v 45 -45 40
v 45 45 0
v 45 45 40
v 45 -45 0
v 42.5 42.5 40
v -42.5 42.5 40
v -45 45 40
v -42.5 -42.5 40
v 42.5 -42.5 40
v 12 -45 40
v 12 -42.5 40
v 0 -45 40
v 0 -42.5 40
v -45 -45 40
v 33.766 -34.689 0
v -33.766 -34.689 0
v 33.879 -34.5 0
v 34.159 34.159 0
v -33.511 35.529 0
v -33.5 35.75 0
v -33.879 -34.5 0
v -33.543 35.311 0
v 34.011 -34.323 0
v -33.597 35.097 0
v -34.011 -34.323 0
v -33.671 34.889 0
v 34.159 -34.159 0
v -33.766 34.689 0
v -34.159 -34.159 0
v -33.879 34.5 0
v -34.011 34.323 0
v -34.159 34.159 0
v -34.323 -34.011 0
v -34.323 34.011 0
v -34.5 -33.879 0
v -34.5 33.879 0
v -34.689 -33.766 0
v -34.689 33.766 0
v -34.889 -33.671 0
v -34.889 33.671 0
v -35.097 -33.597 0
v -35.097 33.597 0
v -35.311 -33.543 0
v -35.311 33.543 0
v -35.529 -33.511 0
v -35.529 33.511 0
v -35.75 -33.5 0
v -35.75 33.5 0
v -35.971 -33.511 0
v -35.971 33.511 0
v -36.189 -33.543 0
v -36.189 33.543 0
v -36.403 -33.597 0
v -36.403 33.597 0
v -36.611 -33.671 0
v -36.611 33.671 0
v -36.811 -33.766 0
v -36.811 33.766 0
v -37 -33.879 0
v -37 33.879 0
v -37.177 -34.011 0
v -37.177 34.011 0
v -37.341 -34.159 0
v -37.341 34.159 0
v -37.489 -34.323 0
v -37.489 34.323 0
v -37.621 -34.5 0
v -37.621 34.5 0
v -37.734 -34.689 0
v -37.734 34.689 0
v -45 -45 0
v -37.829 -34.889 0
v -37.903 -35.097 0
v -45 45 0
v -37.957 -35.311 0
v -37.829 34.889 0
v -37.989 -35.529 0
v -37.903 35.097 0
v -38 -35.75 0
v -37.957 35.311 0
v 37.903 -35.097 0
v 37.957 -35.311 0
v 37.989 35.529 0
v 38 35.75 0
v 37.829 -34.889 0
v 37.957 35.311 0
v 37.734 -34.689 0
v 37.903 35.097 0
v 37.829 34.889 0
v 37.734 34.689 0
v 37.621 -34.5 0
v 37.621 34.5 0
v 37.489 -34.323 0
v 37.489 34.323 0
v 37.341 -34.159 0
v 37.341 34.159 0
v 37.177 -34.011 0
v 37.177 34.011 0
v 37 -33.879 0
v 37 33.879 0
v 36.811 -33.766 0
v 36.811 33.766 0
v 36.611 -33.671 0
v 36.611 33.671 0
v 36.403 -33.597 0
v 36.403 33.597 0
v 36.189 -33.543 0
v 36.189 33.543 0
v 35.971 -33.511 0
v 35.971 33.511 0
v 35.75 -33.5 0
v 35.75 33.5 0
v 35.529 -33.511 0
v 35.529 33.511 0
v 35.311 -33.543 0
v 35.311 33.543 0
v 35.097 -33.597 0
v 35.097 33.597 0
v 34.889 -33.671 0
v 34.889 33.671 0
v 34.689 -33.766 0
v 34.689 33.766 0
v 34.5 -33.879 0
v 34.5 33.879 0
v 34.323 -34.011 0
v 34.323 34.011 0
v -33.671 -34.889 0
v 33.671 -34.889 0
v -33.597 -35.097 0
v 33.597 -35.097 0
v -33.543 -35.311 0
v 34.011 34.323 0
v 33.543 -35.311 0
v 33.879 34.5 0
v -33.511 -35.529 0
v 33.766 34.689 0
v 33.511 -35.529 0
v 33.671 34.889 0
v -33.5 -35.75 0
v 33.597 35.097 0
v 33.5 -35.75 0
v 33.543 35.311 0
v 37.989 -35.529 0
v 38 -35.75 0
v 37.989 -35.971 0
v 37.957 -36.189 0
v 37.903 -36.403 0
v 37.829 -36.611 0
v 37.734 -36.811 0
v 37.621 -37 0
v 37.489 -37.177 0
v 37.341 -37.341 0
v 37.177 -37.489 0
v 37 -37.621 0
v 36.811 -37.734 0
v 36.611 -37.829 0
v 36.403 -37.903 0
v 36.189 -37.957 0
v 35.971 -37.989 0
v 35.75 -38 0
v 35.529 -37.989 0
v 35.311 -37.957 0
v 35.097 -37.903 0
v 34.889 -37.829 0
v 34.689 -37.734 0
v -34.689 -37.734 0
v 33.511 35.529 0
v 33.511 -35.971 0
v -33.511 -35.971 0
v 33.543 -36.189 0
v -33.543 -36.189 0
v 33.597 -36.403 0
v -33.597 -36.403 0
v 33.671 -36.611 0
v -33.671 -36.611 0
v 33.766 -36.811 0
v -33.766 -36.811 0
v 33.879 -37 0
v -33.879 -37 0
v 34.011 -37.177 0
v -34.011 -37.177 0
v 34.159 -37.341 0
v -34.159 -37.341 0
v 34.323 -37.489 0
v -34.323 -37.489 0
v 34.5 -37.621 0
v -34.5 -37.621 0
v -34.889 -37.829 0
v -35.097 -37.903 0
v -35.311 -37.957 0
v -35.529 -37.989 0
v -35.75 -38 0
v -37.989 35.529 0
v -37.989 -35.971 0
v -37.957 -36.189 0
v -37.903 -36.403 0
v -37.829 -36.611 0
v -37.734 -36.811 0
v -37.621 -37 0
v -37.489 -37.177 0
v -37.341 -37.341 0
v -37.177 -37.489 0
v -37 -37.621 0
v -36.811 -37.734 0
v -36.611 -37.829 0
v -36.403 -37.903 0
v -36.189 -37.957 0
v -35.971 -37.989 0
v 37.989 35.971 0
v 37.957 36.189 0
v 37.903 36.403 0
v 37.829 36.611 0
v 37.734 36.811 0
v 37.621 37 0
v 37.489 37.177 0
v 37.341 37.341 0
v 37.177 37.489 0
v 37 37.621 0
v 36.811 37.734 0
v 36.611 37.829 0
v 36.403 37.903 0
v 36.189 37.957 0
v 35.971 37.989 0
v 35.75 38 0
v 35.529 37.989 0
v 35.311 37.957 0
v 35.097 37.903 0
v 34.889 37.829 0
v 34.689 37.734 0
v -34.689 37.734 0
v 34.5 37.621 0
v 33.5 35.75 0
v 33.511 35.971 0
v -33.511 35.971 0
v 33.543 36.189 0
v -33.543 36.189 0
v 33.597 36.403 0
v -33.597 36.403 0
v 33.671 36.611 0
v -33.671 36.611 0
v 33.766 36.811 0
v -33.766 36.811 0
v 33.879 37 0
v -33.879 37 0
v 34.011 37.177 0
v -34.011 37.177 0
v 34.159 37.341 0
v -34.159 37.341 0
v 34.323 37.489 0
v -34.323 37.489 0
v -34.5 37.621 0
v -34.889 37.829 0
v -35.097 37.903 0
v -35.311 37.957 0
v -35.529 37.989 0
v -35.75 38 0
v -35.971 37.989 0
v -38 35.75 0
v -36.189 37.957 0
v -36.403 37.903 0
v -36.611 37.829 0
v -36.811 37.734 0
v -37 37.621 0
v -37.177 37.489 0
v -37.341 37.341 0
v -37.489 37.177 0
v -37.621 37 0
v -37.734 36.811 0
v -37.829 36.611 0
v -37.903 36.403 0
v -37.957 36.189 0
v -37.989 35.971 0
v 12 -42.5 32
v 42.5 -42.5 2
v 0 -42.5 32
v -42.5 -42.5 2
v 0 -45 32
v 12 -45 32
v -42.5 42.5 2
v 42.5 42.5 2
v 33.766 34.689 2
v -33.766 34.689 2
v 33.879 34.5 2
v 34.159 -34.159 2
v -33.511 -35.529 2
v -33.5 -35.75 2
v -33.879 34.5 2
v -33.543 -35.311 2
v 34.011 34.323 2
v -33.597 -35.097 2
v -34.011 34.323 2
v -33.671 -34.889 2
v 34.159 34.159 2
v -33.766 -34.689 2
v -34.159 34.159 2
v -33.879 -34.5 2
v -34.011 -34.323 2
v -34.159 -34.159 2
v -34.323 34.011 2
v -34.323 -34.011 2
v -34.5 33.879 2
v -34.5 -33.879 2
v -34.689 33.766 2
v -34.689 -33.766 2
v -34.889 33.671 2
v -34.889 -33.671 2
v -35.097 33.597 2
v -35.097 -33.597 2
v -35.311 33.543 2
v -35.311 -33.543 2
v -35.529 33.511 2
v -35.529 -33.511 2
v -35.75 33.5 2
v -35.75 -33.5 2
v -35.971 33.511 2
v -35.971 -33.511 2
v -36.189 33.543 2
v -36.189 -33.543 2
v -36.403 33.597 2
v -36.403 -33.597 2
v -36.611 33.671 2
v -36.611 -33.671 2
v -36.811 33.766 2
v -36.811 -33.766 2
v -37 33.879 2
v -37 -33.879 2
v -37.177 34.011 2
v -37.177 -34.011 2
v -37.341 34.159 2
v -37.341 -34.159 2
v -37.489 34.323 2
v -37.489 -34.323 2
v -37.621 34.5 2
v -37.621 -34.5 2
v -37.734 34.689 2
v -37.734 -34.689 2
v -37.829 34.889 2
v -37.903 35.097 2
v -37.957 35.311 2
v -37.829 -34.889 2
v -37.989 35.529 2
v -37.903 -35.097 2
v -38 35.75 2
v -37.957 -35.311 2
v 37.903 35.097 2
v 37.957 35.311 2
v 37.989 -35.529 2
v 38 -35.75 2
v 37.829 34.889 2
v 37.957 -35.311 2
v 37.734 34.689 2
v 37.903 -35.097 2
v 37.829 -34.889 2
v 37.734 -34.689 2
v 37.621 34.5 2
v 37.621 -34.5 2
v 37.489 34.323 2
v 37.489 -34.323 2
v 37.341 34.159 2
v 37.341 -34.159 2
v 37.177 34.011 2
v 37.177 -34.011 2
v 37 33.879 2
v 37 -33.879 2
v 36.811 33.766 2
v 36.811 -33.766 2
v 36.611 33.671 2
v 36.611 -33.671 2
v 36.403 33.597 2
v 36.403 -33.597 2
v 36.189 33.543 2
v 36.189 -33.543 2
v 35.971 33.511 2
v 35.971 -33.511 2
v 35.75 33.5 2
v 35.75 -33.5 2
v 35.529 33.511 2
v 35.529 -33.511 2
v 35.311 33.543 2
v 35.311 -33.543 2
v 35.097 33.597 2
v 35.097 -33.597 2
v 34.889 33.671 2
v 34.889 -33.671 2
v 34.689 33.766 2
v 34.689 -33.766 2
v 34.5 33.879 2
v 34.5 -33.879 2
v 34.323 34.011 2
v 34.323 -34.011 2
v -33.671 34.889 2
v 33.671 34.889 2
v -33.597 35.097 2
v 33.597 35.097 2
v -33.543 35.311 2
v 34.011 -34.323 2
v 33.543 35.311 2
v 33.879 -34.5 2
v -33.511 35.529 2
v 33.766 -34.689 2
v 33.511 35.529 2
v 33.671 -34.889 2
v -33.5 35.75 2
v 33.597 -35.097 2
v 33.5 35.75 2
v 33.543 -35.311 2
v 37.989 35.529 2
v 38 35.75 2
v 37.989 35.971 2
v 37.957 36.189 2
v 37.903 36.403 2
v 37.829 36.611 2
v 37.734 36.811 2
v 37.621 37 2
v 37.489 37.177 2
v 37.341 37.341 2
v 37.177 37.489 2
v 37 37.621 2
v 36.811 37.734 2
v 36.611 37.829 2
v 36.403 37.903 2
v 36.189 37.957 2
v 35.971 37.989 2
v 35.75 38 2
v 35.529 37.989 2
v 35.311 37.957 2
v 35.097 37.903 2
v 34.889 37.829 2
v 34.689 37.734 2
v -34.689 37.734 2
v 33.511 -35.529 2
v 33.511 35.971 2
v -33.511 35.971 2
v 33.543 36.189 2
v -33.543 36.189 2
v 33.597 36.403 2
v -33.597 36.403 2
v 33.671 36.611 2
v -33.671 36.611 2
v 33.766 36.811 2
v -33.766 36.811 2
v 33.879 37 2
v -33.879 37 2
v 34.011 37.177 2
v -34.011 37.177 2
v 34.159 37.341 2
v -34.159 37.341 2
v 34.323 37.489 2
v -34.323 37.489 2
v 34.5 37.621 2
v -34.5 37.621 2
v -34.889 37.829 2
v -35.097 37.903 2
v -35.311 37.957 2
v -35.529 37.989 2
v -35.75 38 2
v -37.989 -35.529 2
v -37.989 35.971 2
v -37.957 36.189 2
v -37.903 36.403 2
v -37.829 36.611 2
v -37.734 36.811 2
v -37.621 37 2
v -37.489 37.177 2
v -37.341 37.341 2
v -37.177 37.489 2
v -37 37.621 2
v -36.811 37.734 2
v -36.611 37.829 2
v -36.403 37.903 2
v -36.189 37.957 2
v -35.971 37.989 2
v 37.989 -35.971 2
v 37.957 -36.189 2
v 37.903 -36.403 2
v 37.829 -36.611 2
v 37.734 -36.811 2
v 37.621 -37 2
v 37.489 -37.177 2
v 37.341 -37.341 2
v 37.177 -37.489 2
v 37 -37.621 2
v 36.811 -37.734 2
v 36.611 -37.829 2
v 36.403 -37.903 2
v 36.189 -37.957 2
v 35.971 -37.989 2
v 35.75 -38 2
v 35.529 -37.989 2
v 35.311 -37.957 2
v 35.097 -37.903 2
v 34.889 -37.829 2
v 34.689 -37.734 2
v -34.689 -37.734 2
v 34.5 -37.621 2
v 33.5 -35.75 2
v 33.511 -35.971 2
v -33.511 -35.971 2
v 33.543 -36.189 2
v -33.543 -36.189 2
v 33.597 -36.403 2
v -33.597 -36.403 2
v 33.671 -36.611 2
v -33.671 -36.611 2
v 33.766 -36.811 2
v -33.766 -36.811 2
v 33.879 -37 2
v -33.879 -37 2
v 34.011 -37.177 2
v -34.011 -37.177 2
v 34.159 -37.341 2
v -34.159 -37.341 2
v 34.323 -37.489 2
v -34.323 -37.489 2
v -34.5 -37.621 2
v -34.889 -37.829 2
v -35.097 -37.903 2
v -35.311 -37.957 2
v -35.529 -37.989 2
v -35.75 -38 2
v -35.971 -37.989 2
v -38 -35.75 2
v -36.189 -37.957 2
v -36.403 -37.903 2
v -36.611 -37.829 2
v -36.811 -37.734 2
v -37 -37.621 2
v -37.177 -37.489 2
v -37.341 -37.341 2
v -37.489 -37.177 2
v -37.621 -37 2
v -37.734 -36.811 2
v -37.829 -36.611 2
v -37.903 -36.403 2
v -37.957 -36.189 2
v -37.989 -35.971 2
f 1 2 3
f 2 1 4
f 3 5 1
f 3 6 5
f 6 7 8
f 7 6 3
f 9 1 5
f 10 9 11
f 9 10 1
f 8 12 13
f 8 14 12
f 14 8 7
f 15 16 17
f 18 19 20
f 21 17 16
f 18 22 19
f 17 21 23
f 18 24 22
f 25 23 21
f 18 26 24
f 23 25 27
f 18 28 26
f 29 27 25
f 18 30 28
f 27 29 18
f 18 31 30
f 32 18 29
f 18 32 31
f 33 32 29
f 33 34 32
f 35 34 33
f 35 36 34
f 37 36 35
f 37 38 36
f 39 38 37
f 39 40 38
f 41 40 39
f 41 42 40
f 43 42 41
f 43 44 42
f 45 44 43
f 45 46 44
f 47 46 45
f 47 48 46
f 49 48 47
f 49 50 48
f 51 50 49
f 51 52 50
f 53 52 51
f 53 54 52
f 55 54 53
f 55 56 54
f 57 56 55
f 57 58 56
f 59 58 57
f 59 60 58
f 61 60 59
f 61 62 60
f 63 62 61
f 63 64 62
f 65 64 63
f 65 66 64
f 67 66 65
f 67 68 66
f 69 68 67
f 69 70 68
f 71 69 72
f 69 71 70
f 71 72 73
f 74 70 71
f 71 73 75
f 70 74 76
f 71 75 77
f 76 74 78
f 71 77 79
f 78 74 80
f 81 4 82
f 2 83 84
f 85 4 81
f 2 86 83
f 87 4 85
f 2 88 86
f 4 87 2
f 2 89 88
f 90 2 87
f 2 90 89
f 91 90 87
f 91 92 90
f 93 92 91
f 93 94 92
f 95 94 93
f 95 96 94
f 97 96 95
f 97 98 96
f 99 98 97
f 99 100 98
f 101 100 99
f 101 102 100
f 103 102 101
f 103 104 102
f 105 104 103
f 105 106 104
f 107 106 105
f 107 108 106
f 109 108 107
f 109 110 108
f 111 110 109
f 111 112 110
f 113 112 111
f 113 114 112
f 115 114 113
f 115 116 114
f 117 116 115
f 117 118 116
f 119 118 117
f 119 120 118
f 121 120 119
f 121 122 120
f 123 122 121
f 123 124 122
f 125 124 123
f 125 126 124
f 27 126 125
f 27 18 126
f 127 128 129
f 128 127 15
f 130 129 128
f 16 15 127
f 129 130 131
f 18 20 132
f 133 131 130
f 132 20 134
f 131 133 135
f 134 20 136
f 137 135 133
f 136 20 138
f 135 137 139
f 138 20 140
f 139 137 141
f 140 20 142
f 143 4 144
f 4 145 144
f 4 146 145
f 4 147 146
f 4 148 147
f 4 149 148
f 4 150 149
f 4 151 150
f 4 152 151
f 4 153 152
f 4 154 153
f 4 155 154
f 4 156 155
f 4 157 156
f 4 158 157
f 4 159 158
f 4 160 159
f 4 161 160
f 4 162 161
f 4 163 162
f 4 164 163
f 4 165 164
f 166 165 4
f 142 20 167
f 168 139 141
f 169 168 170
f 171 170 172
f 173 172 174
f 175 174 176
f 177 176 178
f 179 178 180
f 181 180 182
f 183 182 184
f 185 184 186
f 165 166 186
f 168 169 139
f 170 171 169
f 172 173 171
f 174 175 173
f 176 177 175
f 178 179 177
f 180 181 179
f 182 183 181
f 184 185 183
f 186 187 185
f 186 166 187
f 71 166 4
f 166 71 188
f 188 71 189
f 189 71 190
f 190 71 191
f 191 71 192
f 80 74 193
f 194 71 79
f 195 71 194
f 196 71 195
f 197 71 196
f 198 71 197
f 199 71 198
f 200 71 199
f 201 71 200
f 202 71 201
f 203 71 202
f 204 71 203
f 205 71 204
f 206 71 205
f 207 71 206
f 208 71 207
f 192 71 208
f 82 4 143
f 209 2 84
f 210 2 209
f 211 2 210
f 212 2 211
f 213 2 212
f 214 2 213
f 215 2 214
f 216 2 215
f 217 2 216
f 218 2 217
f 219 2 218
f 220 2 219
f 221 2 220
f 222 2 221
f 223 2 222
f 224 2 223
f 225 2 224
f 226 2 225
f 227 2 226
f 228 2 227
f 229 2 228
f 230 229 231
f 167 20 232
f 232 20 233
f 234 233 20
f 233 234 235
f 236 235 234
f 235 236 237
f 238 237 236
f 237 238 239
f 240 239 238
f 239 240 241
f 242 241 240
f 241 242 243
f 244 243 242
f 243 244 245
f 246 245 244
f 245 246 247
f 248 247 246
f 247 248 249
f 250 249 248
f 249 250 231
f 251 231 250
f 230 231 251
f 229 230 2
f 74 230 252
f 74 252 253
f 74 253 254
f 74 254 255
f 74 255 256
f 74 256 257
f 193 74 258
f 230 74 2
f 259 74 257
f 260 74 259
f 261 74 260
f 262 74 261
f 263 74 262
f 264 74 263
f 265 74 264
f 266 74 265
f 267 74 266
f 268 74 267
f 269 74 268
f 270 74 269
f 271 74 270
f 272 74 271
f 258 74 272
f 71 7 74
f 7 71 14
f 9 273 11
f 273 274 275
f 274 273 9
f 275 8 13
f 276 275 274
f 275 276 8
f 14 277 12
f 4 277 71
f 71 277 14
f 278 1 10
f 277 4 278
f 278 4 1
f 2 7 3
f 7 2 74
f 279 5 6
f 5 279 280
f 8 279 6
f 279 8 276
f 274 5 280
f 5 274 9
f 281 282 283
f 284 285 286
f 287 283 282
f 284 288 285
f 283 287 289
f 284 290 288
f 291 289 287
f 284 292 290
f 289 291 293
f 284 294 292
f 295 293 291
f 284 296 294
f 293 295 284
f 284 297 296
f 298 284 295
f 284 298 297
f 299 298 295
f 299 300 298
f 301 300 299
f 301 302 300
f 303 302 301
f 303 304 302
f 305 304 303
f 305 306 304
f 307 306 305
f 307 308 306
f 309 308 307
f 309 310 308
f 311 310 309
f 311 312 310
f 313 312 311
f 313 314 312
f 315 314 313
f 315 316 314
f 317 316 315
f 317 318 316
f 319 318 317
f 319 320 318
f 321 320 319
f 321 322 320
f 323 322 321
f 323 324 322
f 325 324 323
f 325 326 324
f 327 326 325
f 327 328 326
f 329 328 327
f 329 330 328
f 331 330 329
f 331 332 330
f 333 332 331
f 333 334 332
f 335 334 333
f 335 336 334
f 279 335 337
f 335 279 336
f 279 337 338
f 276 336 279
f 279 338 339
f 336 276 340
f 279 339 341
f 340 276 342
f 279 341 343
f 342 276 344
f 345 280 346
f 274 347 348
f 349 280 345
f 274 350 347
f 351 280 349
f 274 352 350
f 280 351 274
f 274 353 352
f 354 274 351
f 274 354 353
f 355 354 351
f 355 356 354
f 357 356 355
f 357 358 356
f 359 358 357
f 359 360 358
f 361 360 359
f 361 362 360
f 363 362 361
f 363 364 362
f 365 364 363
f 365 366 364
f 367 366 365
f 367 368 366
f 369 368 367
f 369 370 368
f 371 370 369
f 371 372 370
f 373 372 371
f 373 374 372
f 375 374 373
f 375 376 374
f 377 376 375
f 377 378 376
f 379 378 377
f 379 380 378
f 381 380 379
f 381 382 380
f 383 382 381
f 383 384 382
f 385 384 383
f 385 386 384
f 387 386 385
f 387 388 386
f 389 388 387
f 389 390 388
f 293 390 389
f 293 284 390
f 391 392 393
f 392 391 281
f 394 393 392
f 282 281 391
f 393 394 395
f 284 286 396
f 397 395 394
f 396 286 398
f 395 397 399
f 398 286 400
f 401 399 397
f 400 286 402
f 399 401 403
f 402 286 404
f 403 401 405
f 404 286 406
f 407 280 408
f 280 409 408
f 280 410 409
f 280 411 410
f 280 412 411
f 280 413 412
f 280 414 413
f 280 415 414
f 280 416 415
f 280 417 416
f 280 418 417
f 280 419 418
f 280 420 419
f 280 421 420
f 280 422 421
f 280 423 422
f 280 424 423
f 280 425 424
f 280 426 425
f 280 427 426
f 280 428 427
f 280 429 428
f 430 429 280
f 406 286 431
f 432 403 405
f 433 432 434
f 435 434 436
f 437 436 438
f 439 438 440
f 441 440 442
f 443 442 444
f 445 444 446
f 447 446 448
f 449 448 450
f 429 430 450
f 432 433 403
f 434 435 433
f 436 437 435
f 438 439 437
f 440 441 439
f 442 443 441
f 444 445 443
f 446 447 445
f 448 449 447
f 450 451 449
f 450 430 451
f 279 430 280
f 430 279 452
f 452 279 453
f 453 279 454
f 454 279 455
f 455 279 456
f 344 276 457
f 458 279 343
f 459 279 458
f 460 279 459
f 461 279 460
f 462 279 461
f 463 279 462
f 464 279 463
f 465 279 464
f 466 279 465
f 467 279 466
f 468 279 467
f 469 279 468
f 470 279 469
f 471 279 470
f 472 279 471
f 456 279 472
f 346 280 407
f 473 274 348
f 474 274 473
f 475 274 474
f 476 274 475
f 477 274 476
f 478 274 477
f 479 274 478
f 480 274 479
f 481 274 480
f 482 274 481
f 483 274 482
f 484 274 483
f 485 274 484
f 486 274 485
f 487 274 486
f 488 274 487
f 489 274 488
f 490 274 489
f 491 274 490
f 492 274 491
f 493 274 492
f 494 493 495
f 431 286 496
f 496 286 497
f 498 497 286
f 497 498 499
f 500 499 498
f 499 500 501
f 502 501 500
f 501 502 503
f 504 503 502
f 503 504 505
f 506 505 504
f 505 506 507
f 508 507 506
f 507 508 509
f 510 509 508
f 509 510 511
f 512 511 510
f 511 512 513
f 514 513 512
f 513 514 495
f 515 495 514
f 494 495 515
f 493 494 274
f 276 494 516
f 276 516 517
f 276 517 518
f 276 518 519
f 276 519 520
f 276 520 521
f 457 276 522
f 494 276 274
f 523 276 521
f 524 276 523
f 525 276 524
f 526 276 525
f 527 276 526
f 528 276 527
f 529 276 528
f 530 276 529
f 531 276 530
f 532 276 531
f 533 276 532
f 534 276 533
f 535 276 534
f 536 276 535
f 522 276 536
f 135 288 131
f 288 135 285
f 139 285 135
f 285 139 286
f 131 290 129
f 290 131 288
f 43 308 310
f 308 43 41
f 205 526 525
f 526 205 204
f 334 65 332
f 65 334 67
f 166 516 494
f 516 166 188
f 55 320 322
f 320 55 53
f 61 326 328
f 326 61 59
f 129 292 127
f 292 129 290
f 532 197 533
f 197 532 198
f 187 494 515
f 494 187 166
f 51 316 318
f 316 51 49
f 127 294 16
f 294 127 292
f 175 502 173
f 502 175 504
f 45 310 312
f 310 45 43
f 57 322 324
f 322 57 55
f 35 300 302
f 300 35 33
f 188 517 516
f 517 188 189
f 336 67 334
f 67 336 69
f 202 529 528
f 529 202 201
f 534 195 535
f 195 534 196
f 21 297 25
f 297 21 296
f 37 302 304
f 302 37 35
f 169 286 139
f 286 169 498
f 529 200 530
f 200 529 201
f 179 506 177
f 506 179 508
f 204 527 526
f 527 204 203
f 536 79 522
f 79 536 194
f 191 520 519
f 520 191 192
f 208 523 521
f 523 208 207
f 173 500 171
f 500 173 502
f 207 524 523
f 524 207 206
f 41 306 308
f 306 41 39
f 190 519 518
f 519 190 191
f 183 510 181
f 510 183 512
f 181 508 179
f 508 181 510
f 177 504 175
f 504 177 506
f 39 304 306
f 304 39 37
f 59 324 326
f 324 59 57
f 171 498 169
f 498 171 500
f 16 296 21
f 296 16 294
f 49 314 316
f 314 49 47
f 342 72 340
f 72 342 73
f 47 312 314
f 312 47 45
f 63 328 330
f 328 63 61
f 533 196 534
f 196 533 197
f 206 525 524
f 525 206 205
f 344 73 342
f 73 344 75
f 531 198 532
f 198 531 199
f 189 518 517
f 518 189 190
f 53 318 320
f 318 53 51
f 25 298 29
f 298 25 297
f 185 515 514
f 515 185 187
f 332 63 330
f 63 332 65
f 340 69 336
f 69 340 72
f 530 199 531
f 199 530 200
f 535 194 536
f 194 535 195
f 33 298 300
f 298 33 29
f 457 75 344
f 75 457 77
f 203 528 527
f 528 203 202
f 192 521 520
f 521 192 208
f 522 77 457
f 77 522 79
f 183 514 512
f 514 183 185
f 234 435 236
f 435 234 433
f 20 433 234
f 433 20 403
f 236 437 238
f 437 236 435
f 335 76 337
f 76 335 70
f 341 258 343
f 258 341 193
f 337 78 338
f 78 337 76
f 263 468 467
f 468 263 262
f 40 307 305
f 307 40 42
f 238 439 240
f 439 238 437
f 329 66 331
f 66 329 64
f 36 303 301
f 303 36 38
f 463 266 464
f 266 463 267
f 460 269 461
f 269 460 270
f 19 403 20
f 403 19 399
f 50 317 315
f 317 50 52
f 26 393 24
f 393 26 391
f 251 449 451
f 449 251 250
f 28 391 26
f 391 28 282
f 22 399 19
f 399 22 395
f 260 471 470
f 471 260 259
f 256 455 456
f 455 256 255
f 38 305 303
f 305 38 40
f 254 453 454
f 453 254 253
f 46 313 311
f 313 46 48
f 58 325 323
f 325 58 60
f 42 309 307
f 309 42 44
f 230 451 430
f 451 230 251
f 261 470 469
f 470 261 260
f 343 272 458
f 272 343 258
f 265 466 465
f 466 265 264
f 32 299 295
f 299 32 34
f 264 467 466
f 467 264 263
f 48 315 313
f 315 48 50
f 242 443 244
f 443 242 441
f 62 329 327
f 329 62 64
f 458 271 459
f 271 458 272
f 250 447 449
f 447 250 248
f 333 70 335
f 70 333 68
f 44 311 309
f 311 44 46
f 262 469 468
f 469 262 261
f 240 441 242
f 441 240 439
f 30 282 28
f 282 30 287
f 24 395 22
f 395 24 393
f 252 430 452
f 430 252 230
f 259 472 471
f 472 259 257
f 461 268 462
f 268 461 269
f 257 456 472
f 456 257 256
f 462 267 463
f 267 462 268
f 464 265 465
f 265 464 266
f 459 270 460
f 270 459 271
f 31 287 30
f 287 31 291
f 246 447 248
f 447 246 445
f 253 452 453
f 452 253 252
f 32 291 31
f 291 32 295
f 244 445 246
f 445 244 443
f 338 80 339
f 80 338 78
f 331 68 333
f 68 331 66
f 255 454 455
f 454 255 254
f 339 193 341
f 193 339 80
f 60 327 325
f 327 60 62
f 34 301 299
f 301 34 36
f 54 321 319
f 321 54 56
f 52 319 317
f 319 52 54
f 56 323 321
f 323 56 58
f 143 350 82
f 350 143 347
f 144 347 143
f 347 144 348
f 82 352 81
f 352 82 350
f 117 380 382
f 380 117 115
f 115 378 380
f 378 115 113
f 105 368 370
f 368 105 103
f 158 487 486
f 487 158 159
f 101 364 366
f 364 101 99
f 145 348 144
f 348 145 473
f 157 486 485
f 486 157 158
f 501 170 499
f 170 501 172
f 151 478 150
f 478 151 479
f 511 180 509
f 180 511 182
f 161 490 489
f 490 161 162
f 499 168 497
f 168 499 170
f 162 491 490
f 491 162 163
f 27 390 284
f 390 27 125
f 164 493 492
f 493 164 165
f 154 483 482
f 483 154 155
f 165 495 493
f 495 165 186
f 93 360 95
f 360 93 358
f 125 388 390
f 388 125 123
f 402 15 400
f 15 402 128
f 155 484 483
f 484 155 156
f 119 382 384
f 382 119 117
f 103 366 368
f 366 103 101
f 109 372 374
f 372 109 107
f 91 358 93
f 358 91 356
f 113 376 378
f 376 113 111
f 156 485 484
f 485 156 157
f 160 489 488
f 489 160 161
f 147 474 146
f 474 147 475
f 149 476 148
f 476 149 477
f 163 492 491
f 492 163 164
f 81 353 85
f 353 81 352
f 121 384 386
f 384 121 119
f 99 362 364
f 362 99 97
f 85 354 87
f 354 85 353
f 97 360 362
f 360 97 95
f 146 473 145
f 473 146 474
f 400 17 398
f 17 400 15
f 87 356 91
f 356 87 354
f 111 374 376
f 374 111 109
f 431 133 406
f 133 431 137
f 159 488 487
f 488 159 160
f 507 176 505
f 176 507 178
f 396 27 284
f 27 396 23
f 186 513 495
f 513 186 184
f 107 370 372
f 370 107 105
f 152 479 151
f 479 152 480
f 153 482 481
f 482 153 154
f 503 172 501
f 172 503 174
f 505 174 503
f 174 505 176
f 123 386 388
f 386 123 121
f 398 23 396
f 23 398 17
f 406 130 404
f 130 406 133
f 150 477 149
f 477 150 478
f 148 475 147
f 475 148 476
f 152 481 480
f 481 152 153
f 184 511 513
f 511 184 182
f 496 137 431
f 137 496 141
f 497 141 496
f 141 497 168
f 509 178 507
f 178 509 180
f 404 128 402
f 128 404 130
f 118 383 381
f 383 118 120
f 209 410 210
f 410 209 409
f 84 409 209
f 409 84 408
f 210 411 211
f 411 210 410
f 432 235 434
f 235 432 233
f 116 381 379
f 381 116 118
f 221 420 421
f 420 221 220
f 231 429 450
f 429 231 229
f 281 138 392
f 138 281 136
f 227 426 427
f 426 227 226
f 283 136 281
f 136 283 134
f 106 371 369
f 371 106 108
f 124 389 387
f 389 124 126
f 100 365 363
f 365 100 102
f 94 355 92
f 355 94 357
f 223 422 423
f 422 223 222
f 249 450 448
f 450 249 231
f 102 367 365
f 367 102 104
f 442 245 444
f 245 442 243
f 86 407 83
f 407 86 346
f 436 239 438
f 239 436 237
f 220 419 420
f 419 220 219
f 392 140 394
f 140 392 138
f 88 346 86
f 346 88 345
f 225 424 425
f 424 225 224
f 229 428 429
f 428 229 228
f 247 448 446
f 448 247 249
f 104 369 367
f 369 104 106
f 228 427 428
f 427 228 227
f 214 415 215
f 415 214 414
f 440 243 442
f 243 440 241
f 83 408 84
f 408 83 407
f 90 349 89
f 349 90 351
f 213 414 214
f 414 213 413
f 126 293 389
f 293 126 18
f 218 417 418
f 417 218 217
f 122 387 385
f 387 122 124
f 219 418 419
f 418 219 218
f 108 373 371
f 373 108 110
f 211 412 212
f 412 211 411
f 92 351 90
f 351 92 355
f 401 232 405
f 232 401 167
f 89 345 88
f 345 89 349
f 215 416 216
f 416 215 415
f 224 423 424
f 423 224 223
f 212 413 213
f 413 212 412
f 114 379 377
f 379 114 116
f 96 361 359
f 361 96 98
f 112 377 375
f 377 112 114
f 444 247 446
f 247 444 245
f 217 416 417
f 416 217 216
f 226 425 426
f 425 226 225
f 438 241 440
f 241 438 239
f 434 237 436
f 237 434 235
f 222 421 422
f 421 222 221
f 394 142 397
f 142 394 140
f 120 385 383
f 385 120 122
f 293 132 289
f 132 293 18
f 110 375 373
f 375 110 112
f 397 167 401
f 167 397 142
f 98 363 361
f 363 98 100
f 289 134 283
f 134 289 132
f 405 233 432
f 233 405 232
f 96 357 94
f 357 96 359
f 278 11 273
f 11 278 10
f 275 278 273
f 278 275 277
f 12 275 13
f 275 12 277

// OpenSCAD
// Housing for a DIY magnetic stirrer built from an 80 mm PC case fan.
// Modelled in print orientation (upside down): the 2 mm top plate lies on the bed
// (z = 0 to 2) and four 2.5 mm walls rise from it to z = 40, where the box is open.

$fn = 64;

// ---- Dimensions (mm) ----
outer_x   = 90;   // outer size in X
outer_y   = 90;   // outer size in Y
wall_t    = 2.5;  // wall thickness
top_t     = 2;    // top plate thickness (lies on the bed in print orientation)
wall_h    = 40;   // total height of the walls (z = 0 to 40)

hole_d    = 4.5;  // M4 clearance hole diameter in the top plate
hole_pitch= 71.5; // square pitch of the four mounting holes, centred on the plate

notch_w   = 12;   // width of the power-cable notch
notch_top = 40;   // top of the notch (open edge of the box)
notch_bot = 32;   // bottom of the notch (8 mm down from the open edge)

// ---- Base: 2 mm top plate on the bed (z = 0 to 2) ----
module top_plate() {
    translate([-outer_x/2, -outer_y/2, 0])
        cube([outer_x, outer_y, top_t]);
}

// ---- Four walls rising from the plate to z = 40 ----
module walls() { union() {
    // Front wall (negative Y side)
    translate([-outer_x/2, -outer_y/2, 0])
        cube([outer_x, wall_t, wall_h]);

    // Back wall (positive Y side)
    translate([-outer_x/2, outer_y/2 - wall_t, 0])
        cube([outer_x, wall_t, wall_h]);

    // Left wall (negative X side)
    translate([-outer_x/2, -outer_y/2 + wall_t, 0])
        cube([wall_t, outer_y - 2*wall_t, wall_h]);

    // Right wall (positive X side)
    translate([outer_x/2 - wall_t, -outer_y/2 + wall_t, 0])
        cube([wall_t, outer_y - 2*wall_t, wall_h]);
} }

// ---- Four M4 clearance holes through the top plate ----
// 71.5 mm square pattern centred on the plate; each hole is 4.5 mm in diameter.
// The cylinders extend 0.5 mm past each face of the 2 mm plate so no faces are coplanar.
module holes() { for (sx = [-1, 1], sy = [-1, 1])
    translate([sx * hole_pitch/2, sy * hole_pitch/2, -0.5])
        cylinder(h = top_t + 1.0, d = hole_d, $fn = 64); }

// ---- Power-cable notch in one wall (front wall, negative Y side) ----
// 12 mm wide, centred along the wall, from z = 32 to z = 40.
// The cutter extends 0.5 mm past the outer face and 1 mm past the open top edge.
module notch_cutter() { translate([0, -outer_y/2 - 0.5, notch_bot])
    cube([notch_w, wall_t + 1.0, notch_top - notch_bot + 1.0]); }

// ---- Final solid ----
difference() {
    union() {
        top_plate();
        walls();
    }
    holes();
    notch_cutter();
}
